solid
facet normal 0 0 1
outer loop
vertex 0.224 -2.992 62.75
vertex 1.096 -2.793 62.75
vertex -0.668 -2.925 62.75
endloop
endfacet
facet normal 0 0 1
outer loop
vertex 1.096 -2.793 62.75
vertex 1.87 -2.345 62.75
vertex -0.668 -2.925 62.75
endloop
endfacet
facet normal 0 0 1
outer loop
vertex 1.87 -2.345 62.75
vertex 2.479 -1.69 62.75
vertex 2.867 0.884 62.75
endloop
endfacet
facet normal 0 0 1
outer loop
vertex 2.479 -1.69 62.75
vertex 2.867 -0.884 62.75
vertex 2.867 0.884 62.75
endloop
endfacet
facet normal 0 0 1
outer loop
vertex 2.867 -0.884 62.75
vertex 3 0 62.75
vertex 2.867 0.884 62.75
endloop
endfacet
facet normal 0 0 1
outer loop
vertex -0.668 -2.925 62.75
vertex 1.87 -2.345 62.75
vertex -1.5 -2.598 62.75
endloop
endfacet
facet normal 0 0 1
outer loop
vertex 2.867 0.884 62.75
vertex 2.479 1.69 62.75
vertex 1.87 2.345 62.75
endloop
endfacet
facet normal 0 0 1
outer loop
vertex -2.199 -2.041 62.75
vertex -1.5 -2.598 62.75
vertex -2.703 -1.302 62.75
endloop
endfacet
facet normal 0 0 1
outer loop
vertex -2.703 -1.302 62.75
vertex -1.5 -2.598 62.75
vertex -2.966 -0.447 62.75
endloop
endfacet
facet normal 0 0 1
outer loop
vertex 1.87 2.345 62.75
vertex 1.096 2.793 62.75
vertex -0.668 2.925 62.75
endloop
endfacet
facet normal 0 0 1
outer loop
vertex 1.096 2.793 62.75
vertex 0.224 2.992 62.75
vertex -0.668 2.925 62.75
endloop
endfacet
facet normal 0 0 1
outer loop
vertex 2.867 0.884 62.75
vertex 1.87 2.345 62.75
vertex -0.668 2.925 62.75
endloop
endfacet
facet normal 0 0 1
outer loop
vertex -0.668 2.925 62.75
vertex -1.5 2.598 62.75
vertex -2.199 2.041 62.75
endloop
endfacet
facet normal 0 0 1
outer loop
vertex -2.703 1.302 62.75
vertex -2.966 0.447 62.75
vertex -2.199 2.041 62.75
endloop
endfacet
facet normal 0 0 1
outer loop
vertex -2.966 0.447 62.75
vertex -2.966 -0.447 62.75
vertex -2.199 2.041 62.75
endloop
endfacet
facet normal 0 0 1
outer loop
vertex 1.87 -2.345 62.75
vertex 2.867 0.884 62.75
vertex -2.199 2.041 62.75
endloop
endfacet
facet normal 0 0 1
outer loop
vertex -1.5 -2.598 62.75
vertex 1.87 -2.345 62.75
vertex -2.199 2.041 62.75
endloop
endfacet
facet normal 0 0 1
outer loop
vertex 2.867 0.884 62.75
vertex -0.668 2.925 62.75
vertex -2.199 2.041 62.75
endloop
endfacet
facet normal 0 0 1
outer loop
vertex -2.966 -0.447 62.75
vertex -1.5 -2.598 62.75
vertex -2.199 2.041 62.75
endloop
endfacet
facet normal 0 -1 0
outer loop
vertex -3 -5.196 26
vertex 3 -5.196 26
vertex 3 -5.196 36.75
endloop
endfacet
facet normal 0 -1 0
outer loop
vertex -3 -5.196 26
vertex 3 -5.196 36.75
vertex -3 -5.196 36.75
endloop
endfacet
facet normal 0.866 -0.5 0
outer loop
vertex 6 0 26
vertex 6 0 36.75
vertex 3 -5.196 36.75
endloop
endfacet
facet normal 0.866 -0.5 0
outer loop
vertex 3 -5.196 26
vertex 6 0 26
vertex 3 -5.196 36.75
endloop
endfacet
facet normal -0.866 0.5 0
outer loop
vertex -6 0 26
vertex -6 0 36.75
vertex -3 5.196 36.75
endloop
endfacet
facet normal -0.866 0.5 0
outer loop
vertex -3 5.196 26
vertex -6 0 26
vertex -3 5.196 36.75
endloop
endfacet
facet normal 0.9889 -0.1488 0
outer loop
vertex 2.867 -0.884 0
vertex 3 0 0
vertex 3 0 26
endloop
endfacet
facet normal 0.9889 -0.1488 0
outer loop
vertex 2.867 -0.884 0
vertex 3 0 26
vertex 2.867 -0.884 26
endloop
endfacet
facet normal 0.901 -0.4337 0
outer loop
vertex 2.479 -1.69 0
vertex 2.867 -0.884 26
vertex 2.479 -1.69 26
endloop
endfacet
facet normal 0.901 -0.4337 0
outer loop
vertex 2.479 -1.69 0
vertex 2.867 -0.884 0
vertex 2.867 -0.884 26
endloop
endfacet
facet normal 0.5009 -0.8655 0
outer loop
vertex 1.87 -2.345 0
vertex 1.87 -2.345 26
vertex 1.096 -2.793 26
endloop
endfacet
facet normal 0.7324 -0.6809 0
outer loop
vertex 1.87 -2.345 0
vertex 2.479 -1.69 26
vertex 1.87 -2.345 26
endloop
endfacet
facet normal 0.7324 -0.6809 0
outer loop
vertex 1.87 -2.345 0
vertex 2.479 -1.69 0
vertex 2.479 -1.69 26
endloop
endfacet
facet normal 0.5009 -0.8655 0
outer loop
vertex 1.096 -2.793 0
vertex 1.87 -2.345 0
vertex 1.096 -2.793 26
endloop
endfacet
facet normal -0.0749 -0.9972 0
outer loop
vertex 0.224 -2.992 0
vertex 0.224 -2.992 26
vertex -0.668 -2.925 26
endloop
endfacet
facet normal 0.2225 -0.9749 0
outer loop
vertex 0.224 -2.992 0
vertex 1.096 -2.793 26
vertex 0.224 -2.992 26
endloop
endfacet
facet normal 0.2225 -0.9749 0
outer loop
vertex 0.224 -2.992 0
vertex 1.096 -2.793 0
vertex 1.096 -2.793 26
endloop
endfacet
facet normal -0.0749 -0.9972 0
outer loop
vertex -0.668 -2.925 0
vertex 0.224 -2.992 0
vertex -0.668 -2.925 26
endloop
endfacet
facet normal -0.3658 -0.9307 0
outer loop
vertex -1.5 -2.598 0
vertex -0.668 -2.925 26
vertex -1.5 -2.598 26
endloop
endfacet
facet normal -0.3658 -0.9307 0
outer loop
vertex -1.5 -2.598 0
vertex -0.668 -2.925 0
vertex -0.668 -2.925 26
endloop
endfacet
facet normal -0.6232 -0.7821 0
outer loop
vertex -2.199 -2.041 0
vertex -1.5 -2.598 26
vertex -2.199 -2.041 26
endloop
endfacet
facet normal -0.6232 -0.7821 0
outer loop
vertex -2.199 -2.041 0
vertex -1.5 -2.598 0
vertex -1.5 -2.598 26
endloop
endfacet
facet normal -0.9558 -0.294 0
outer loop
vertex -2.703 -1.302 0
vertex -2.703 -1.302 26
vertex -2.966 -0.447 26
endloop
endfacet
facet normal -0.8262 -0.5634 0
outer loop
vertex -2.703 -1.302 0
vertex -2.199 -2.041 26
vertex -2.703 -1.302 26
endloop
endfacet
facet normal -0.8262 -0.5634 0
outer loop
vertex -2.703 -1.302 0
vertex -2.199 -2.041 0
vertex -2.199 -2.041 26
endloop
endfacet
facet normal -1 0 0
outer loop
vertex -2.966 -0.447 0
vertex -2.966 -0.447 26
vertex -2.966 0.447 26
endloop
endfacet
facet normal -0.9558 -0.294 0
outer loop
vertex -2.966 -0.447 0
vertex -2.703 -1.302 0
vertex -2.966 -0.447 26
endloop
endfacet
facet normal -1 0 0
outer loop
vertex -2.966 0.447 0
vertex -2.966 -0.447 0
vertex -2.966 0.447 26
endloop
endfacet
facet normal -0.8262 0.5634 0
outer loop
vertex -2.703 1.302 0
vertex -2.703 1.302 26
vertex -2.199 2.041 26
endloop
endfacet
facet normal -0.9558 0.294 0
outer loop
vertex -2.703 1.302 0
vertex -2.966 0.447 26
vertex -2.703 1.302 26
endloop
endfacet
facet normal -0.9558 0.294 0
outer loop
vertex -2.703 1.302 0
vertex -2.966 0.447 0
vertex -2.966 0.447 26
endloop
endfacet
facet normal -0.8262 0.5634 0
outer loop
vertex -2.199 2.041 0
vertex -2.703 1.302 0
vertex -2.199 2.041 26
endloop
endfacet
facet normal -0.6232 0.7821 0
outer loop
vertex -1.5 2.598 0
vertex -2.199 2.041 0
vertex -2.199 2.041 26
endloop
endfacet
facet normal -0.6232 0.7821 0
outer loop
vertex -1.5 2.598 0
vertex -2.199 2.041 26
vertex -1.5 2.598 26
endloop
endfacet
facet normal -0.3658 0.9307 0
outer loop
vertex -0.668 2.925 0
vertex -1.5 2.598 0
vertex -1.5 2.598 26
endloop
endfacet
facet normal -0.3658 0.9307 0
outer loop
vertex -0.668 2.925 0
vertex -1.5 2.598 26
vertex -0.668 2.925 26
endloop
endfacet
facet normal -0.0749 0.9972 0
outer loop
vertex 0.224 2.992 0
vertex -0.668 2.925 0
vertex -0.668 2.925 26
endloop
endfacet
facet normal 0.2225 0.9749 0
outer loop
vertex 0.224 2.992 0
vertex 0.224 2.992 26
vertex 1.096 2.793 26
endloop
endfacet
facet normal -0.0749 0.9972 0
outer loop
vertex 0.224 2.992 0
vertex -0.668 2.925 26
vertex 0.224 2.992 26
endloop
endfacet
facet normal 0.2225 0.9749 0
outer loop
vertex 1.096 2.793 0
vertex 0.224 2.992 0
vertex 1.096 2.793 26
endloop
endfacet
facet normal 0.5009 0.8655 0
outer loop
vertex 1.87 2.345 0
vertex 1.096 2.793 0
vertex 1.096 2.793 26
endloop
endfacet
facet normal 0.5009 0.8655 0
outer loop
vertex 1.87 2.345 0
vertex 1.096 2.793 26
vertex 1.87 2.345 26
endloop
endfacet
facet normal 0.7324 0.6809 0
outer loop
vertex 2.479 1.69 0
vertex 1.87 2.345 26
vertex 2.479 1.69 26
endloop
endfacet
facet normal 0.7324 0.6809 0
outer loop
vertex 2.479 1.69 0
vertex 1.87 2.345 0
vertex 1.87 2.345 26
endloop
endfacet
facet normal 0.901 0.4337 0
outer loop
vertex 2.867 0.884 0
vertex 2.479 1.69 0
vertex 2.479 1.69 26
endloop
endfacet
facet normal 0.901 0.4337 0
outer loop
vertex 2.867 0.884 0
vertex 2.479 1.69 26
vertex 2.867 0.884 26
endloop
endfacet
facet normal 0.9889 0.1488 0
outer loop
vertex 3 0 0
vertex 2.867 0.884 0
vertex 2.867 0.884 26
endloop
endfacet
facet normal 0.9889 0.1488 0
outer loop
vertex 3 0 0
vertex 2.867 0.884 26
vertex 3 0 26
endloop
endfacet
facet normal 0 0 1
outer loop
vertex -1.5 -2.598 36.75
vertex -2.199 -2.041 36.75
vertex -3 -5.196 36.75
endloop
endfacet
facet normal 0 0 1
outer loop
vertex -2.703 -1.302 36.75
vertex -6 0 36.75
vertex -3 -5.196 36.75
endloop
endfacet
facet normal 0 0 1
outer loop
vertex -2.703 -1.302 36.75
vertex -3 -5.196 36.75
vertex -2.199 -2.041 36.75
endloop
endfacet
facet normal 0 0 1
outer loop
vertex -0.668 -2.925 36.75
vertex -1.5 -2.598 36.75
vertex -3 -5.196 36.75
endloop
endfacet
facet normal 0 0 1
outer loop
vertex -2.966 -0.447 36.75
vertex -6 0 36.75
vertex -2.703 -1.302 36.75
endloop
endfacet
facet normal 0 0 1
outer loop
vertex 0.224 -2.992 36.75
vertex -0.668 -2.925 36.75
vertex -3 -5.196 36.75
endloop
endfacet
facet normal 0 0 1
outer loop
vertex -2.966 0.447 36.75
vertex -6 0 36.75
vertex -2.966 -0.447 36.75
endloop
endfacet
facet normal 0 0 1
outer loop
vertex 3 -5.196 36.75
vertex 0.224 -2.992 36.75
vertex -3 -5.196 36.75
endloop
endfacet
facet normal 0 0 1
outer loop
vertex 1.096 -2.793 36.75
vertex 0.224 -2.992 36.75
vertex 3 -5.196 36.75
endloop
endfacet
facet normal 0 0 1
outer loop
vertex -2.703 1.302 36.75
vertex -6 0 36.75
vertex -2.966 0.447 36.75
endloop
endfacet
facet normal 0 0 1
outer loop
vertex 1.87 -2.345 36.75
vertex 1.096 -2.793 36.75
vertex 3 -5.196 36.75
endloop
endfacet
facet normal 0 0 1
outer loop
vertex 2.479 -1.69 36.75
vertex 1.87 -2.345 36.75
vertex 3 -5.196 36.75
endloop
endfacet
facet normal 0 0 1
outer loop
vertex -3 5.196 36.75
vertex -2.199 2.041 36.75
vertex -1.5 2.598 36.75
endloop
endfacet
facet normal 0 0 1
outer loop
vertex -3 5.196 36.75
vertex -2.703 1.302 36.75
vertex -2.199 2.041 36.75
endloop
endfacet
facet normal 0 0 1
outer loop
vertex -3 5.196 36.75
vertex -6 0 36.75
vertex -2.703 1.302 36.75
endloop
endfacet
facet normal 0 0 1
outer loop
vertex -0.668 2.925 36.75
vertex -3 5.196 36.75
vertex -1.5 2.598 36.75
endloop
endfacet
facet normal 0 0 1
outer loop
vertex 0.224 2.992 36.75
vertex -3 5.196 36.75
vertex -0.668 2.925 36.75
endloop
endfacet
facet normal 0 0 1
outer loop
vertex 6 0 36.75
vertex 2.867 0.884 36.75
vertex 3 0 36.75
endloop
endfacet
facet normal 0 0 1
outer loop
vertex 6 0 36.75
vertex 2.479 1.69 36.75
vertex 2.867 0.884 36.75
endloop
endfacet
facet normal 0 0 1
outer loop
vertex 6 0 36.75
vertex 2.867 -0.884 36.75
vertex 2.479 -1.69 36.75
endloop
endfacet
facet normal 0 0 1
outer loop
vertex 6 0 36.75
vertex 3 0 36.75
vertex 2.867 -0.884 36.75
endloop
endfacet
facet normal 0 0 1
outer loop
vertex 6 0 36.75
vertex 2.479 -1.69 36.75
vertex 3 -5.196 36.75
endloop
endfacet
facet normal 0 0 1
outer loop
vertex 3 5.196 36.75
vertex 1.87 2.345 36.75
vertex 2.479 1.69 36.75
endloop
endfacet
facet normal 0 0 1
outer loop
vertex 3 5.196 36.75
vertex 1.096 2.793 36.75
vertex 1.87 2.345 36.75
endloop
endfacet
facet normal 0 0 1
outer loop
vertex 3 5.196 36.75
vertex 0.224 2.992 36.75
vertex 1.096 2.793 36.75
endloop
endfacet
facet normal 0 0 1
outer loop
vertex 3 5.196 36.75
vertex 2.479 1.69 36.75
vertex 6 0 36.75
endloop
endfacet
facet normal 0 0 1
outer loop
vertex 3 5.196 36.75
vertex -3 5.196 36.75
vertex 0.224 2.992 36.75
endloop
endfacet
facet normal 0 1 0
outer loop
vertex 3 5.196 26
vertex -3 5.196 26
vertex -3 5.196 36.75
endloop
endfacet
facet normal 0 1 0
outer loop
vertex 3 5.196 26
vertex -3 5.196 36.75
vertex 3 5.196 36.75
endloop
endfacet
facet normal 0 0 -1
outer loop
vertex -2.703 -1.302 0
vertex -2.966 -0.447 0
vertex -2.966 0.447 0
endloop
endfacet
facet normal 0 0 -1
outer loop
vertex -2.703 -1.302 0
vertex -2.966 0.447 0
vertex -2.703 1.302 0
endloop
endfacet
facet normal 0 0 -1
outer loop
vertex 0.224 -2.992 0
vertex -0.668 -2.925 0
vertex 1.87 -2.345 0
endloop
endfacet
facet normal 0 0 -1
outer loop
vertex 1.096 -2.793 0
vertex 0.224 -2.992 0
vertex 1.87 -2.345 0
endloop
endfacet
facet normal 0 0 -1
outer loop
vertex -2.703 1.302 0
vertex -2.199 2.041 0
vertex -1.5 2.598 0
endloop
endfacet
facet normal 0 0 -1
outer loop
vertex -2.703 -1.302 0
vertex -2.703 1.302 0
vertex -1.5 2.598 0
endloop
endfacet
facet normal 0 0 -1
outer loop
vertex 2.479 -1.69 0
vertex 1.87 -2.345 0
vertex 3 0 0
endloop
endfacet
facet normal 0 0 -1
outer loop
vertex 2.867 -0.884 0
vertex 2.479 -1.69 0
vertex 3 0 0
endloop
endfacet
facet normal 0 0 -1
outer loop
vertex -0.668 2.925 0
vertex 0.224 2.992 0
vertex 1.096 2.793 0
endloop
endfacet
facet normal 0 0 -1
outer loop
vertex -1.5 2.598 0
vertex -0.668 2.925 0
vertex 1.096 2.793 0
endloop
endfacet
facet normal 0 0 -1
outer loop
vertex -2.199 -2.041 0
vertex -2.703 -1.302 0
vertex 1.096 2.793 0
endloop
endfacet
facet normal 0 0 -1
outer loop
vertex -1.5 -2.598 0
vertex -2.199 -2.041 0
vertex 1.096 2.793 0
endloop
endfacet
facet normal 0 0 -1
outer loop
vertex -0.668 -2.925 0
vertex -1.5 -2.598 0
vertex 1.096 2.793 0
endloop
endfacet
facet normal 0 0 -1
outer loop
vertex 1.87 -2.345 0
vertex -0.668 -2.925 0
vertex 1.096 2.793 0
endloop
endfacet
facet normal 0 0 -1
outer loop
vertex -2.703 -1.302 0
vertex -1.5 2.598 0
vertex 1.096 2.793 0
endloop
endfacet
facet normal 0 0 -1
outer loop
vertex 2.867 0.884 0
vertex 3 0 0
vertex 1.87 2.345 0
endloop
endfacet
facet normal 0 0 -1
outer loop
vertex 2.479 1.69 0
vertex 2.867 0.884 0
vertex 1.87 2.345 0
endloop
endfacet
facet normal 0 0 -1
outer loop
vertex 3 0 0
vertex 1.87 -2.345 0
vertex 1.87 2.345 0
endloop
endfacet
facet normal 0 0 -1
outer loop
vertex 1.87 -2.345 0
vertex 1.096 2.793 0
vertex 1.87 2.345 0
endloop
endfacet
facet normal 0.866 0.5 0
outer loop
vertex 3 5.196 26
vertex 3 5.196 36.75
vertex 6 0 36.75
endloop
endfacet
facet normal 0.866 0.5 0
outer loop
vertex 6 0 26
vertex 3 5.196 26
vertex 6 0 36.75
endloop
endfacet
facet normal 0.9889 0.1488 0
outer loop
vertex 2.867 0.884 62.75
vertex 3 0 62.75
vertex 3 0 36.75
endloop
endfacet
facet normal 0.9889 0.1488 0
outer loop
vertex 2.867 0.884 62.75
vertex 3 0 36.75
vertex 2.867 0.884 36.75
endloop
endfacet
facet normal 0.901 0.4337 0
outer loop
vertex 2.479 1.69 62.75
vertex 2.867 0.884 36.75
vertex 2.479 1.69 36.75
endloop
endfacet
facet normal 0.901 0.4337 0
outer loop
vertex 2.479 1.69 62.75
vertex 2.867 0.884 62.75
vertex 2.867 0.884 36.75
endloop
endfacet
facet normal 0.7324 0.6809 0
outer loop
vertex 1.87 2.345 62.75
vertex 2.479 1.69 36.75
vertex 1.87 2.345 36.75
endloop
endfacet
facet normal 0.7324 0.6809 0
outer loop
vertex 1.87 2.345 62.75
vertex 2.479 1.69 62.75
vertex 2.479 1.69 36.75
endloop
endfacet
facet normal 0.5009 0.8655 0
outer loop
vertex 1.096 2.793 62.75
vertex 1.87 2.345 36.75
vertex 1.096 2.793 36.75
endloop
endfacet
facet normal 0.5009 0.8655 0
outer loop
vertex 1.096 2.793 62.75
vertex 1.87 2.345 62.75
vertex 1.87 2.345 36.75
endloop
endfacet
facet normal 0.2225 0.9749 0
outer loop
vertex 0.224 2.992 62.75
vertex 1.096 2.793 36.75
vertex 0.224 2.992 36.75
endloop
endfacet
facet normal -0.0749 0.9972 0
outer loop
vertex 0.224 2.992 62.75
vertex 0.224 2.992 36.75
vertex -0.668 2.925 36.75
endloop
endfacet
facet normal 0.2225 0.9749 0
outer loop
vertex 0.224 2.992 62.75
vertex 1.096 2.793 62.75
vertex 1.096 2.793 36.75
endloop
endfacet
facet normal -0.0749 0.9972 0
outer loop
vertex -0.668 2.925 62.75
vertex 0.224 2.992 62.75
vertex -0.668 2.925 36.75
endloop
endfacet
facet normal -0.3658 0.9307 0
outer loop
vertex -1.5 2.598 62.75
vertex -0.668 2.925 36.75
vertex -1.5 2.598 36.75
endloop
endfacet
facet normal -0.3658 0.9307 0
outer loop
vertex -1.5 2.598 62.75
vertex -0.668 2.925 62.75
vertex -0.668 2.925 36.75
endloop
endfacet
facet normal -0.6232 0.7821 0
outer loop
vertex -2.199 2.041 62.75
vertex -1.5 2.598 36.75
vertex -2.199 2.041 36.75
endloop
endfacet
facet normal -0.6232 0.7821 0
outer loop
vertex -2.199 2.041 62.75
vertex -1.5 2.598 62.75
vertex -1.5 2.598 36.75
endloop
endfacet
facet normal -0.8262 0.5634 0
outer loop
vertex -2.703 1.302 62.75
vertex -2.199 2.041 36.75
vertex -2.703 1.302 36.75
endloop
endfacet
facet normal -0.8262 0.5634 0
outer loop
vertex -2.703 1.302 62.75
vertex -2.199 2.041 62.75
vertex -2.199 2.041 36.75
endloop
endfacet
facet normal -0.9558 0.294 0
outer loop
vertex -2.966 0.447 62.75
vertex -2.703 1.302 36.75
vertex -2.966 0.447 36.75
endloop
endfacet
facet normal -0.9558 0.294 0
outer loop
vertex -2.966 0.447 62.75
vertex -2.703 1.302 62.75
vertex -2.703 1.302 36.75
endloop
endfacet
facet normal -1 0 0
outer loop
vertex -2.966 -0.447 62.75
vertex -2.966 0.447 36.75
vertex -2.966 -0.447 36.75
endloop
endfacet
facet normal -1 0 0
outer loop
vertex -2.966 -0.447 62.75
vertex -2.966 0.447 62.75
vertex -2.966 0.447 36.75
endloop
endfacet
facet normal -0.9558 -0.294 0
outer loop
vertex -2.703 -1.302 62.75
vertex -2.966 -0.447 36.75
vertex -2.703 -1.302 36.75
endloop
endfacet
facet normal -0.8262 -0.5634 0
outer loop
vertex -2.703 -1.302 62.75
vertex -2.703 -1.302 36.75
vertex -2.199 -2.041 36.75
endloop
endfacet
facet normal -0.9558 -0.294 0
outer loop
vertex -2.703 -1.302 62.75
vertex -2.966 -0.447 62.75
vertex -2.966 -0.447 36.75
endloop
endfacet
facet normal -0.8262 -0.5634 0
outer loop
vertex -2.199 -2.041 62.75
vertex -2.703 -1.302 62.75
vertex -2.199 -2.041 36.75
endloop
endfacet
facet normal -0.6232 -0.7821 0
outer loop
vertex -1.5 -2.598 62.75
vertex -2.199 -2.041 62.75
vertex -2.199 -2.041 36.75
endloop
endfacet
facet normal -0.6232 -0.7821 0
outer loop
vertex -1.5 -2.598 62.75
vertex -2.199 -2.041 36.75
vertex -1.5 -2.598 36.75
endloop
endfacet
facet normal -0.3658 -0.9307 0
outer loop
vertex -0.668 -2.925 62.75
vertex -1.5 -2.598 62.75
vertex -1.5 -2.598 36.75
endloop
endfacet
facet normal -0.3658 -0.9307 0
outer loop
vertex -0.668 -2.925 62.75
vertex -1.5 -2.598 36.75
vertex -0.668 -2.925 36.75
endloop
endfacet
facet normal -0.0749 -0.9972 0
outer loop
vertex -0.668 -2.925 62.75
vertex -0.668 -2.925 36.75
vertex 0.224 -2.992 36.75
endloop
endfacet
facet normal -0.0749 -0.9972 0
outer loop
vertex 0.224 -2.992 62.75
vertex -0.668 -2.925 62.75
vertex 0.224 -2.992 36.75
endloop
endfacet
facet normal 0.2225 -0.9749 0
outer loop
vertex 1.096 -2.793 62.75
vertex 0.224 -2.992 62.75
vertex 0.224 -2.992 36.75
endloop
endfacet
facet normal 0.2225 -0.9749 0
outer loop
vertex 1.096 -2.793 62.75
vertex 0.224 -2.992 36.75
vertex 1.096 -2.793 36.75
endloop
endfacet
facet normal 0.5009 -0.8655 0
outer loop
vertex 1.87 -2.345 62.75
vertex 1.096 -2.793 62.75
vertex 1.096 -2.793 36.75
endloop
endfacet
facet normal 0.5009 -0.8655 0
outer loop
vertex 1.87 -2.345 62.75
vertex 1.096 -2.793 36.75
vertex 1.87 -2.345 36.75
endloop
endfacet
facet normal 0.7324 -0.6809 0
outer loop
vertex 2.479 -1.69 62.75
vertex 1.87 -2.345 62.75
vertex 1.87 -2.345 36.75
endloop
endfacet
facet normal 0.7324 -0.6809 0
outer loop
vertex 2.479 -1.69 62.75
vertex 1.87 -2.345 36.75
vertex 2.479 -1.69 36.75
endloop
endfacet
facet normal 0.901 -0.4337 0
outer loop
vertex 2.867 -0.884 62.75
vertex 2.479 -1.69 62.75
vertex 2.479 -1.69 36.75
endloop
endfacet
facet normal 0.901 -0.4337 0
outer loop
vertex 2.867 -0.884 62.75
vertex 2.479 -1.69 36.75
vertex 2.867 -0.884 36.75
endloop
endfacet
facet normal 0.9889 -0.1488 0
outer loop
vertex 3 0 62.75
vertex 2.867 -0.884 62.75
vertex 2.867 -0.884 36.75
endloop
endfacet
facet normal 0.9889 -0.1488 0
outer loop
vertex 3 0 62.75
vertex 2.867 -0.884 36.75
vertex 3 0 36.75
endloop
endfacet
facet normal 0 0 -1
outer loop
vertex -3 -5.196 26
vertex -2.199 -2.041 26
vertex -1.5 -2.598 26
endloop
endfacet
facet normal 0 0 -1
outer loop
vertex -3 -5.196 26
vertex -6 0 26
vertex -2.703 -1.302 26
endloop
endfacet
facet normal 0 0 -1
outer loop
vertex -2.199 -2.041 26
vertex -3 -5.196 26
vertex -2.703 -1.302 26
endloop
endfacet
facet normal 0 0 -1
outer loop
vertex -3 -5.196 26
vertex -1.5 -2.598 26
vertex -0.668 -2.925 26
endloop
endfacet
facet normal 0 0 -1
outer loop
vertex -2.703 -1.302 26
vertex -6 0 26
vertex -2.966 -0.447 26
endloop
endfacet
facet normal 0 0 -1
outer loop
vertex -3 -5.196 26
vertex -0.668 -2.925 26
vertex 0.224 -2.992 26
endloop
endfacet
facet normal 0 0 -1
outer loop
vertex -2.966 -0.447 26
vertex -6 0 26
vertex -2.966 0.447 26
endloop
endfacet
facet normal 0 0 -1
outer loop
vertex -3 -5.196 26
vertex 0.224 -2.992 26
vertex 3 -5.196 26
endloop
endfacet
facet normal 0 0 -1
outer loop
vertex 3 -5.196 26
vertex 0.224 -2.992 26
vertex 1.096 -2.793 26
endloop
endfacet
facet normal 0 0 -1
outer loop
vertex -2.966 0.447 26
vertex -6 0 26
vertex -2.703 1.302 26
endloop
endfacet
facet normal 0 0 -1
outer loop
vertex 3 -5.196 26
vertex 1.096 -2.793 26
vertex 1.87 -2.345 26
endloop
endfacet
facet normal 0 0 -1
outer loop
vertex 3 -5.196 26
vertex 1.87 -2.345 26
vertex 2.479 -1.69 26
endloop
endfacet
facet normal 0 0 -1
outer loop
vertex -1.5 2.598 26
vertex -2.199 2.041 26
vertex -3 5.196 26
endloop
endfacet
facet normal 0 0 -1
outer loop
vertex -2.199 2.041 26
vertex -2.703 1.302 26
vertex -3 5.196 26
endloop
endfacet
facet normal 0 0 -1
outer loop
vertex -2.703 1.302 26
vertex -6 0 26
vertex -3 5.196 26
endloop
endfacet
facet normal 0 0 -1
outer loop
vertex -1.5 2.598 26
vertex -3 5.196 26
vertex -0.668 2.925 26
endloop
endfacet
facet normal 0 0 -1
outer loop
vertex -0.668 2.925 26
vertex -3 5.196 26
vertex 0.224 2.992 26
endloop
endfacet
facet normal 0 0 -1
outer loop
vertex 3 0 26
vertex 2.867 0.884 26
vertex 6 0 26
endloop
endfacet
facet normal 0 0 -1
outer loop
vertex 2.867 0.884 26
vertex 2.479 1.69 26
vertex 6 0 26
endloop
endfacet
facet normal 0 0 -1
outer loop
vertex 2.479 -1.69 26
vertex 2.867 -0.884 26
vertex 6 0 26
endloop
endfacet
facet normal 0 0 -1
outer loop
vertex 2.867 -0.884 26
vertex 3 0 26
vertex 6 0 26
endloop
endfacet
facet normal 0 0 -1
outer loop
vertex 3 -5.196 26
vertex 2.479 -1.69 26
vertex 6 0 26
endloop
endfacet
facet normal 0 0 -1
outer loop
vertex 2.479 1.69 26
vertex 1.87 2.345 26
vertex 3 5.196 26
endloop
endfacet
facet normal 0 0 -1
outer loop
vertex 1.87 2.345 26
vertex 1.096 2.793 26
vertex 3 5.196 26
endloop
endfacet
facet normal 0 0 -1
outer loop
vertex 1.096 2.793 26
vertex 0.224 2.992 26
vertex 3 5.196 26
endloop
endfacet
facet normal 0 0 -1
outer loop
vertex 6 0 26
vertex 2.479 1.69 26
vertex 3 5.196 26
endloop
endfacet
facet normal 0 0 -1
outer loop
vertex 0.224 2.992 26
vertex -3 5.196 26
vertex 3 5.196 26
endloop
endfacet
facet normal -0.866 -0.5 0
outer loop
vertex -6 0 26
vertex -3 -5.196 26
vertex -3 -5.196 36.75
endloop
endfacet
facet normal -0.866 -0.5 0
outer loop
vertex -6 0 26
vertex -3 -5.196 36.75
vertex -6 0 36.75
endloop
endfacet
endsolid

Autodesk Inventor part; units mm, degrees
ref_plane "YZ Plane" through (0, 0, 0) normal (1, 0, 0) x (0, 1, 0)
ref_plane "XZ Plane" through (0, 0, 0) normal (0, 1, 0) x (-1, 0, 0)
sketch "Boceto1" plane through (0, 0, 0) normal (0, 0, 1) x (1, 0, 0)
  circle A0 centre (0, 0) radius 3
  dimension "d0" = 6
extrude "Extrusión1" add sketch "Boceto1" along normal blind 26
sketch "Boceto2" plane through (0, 0, 26) normal (0, 0, 1) x (1, 0, 0)
  line L0 (6, 0) -> (3, -5.1962)
  line L1 (3, -5.1962) -> (-3, -5.1962)
  line L2 (-3, -5.1962) -> (-6, 0)
  line L3 (-6, 0) -> (-3, 5.1962)
  line L4 (-3, 5.1962) -> (3, 5.1962)
  line L5 (3, 5.1962) -> (6, 0)
  point P0 (0, 0)
  point P1 (0, 0)
  point P2 (0, 5.1962)
  dimension "d3" = 6
extrude "Extrusión2" add sketch "Boceto2" along normal blind 10.75
ref_plane "Plano de trabajo1" through (0, 0, 31.375) normal (0, 0, 1) x (1, 0, 0)
mirror "Simetría1" about plane through (0, 0, 31.375) normal (0, 0, 1) of "Extrusión1"
properties part number "wheel_shock_pin"
